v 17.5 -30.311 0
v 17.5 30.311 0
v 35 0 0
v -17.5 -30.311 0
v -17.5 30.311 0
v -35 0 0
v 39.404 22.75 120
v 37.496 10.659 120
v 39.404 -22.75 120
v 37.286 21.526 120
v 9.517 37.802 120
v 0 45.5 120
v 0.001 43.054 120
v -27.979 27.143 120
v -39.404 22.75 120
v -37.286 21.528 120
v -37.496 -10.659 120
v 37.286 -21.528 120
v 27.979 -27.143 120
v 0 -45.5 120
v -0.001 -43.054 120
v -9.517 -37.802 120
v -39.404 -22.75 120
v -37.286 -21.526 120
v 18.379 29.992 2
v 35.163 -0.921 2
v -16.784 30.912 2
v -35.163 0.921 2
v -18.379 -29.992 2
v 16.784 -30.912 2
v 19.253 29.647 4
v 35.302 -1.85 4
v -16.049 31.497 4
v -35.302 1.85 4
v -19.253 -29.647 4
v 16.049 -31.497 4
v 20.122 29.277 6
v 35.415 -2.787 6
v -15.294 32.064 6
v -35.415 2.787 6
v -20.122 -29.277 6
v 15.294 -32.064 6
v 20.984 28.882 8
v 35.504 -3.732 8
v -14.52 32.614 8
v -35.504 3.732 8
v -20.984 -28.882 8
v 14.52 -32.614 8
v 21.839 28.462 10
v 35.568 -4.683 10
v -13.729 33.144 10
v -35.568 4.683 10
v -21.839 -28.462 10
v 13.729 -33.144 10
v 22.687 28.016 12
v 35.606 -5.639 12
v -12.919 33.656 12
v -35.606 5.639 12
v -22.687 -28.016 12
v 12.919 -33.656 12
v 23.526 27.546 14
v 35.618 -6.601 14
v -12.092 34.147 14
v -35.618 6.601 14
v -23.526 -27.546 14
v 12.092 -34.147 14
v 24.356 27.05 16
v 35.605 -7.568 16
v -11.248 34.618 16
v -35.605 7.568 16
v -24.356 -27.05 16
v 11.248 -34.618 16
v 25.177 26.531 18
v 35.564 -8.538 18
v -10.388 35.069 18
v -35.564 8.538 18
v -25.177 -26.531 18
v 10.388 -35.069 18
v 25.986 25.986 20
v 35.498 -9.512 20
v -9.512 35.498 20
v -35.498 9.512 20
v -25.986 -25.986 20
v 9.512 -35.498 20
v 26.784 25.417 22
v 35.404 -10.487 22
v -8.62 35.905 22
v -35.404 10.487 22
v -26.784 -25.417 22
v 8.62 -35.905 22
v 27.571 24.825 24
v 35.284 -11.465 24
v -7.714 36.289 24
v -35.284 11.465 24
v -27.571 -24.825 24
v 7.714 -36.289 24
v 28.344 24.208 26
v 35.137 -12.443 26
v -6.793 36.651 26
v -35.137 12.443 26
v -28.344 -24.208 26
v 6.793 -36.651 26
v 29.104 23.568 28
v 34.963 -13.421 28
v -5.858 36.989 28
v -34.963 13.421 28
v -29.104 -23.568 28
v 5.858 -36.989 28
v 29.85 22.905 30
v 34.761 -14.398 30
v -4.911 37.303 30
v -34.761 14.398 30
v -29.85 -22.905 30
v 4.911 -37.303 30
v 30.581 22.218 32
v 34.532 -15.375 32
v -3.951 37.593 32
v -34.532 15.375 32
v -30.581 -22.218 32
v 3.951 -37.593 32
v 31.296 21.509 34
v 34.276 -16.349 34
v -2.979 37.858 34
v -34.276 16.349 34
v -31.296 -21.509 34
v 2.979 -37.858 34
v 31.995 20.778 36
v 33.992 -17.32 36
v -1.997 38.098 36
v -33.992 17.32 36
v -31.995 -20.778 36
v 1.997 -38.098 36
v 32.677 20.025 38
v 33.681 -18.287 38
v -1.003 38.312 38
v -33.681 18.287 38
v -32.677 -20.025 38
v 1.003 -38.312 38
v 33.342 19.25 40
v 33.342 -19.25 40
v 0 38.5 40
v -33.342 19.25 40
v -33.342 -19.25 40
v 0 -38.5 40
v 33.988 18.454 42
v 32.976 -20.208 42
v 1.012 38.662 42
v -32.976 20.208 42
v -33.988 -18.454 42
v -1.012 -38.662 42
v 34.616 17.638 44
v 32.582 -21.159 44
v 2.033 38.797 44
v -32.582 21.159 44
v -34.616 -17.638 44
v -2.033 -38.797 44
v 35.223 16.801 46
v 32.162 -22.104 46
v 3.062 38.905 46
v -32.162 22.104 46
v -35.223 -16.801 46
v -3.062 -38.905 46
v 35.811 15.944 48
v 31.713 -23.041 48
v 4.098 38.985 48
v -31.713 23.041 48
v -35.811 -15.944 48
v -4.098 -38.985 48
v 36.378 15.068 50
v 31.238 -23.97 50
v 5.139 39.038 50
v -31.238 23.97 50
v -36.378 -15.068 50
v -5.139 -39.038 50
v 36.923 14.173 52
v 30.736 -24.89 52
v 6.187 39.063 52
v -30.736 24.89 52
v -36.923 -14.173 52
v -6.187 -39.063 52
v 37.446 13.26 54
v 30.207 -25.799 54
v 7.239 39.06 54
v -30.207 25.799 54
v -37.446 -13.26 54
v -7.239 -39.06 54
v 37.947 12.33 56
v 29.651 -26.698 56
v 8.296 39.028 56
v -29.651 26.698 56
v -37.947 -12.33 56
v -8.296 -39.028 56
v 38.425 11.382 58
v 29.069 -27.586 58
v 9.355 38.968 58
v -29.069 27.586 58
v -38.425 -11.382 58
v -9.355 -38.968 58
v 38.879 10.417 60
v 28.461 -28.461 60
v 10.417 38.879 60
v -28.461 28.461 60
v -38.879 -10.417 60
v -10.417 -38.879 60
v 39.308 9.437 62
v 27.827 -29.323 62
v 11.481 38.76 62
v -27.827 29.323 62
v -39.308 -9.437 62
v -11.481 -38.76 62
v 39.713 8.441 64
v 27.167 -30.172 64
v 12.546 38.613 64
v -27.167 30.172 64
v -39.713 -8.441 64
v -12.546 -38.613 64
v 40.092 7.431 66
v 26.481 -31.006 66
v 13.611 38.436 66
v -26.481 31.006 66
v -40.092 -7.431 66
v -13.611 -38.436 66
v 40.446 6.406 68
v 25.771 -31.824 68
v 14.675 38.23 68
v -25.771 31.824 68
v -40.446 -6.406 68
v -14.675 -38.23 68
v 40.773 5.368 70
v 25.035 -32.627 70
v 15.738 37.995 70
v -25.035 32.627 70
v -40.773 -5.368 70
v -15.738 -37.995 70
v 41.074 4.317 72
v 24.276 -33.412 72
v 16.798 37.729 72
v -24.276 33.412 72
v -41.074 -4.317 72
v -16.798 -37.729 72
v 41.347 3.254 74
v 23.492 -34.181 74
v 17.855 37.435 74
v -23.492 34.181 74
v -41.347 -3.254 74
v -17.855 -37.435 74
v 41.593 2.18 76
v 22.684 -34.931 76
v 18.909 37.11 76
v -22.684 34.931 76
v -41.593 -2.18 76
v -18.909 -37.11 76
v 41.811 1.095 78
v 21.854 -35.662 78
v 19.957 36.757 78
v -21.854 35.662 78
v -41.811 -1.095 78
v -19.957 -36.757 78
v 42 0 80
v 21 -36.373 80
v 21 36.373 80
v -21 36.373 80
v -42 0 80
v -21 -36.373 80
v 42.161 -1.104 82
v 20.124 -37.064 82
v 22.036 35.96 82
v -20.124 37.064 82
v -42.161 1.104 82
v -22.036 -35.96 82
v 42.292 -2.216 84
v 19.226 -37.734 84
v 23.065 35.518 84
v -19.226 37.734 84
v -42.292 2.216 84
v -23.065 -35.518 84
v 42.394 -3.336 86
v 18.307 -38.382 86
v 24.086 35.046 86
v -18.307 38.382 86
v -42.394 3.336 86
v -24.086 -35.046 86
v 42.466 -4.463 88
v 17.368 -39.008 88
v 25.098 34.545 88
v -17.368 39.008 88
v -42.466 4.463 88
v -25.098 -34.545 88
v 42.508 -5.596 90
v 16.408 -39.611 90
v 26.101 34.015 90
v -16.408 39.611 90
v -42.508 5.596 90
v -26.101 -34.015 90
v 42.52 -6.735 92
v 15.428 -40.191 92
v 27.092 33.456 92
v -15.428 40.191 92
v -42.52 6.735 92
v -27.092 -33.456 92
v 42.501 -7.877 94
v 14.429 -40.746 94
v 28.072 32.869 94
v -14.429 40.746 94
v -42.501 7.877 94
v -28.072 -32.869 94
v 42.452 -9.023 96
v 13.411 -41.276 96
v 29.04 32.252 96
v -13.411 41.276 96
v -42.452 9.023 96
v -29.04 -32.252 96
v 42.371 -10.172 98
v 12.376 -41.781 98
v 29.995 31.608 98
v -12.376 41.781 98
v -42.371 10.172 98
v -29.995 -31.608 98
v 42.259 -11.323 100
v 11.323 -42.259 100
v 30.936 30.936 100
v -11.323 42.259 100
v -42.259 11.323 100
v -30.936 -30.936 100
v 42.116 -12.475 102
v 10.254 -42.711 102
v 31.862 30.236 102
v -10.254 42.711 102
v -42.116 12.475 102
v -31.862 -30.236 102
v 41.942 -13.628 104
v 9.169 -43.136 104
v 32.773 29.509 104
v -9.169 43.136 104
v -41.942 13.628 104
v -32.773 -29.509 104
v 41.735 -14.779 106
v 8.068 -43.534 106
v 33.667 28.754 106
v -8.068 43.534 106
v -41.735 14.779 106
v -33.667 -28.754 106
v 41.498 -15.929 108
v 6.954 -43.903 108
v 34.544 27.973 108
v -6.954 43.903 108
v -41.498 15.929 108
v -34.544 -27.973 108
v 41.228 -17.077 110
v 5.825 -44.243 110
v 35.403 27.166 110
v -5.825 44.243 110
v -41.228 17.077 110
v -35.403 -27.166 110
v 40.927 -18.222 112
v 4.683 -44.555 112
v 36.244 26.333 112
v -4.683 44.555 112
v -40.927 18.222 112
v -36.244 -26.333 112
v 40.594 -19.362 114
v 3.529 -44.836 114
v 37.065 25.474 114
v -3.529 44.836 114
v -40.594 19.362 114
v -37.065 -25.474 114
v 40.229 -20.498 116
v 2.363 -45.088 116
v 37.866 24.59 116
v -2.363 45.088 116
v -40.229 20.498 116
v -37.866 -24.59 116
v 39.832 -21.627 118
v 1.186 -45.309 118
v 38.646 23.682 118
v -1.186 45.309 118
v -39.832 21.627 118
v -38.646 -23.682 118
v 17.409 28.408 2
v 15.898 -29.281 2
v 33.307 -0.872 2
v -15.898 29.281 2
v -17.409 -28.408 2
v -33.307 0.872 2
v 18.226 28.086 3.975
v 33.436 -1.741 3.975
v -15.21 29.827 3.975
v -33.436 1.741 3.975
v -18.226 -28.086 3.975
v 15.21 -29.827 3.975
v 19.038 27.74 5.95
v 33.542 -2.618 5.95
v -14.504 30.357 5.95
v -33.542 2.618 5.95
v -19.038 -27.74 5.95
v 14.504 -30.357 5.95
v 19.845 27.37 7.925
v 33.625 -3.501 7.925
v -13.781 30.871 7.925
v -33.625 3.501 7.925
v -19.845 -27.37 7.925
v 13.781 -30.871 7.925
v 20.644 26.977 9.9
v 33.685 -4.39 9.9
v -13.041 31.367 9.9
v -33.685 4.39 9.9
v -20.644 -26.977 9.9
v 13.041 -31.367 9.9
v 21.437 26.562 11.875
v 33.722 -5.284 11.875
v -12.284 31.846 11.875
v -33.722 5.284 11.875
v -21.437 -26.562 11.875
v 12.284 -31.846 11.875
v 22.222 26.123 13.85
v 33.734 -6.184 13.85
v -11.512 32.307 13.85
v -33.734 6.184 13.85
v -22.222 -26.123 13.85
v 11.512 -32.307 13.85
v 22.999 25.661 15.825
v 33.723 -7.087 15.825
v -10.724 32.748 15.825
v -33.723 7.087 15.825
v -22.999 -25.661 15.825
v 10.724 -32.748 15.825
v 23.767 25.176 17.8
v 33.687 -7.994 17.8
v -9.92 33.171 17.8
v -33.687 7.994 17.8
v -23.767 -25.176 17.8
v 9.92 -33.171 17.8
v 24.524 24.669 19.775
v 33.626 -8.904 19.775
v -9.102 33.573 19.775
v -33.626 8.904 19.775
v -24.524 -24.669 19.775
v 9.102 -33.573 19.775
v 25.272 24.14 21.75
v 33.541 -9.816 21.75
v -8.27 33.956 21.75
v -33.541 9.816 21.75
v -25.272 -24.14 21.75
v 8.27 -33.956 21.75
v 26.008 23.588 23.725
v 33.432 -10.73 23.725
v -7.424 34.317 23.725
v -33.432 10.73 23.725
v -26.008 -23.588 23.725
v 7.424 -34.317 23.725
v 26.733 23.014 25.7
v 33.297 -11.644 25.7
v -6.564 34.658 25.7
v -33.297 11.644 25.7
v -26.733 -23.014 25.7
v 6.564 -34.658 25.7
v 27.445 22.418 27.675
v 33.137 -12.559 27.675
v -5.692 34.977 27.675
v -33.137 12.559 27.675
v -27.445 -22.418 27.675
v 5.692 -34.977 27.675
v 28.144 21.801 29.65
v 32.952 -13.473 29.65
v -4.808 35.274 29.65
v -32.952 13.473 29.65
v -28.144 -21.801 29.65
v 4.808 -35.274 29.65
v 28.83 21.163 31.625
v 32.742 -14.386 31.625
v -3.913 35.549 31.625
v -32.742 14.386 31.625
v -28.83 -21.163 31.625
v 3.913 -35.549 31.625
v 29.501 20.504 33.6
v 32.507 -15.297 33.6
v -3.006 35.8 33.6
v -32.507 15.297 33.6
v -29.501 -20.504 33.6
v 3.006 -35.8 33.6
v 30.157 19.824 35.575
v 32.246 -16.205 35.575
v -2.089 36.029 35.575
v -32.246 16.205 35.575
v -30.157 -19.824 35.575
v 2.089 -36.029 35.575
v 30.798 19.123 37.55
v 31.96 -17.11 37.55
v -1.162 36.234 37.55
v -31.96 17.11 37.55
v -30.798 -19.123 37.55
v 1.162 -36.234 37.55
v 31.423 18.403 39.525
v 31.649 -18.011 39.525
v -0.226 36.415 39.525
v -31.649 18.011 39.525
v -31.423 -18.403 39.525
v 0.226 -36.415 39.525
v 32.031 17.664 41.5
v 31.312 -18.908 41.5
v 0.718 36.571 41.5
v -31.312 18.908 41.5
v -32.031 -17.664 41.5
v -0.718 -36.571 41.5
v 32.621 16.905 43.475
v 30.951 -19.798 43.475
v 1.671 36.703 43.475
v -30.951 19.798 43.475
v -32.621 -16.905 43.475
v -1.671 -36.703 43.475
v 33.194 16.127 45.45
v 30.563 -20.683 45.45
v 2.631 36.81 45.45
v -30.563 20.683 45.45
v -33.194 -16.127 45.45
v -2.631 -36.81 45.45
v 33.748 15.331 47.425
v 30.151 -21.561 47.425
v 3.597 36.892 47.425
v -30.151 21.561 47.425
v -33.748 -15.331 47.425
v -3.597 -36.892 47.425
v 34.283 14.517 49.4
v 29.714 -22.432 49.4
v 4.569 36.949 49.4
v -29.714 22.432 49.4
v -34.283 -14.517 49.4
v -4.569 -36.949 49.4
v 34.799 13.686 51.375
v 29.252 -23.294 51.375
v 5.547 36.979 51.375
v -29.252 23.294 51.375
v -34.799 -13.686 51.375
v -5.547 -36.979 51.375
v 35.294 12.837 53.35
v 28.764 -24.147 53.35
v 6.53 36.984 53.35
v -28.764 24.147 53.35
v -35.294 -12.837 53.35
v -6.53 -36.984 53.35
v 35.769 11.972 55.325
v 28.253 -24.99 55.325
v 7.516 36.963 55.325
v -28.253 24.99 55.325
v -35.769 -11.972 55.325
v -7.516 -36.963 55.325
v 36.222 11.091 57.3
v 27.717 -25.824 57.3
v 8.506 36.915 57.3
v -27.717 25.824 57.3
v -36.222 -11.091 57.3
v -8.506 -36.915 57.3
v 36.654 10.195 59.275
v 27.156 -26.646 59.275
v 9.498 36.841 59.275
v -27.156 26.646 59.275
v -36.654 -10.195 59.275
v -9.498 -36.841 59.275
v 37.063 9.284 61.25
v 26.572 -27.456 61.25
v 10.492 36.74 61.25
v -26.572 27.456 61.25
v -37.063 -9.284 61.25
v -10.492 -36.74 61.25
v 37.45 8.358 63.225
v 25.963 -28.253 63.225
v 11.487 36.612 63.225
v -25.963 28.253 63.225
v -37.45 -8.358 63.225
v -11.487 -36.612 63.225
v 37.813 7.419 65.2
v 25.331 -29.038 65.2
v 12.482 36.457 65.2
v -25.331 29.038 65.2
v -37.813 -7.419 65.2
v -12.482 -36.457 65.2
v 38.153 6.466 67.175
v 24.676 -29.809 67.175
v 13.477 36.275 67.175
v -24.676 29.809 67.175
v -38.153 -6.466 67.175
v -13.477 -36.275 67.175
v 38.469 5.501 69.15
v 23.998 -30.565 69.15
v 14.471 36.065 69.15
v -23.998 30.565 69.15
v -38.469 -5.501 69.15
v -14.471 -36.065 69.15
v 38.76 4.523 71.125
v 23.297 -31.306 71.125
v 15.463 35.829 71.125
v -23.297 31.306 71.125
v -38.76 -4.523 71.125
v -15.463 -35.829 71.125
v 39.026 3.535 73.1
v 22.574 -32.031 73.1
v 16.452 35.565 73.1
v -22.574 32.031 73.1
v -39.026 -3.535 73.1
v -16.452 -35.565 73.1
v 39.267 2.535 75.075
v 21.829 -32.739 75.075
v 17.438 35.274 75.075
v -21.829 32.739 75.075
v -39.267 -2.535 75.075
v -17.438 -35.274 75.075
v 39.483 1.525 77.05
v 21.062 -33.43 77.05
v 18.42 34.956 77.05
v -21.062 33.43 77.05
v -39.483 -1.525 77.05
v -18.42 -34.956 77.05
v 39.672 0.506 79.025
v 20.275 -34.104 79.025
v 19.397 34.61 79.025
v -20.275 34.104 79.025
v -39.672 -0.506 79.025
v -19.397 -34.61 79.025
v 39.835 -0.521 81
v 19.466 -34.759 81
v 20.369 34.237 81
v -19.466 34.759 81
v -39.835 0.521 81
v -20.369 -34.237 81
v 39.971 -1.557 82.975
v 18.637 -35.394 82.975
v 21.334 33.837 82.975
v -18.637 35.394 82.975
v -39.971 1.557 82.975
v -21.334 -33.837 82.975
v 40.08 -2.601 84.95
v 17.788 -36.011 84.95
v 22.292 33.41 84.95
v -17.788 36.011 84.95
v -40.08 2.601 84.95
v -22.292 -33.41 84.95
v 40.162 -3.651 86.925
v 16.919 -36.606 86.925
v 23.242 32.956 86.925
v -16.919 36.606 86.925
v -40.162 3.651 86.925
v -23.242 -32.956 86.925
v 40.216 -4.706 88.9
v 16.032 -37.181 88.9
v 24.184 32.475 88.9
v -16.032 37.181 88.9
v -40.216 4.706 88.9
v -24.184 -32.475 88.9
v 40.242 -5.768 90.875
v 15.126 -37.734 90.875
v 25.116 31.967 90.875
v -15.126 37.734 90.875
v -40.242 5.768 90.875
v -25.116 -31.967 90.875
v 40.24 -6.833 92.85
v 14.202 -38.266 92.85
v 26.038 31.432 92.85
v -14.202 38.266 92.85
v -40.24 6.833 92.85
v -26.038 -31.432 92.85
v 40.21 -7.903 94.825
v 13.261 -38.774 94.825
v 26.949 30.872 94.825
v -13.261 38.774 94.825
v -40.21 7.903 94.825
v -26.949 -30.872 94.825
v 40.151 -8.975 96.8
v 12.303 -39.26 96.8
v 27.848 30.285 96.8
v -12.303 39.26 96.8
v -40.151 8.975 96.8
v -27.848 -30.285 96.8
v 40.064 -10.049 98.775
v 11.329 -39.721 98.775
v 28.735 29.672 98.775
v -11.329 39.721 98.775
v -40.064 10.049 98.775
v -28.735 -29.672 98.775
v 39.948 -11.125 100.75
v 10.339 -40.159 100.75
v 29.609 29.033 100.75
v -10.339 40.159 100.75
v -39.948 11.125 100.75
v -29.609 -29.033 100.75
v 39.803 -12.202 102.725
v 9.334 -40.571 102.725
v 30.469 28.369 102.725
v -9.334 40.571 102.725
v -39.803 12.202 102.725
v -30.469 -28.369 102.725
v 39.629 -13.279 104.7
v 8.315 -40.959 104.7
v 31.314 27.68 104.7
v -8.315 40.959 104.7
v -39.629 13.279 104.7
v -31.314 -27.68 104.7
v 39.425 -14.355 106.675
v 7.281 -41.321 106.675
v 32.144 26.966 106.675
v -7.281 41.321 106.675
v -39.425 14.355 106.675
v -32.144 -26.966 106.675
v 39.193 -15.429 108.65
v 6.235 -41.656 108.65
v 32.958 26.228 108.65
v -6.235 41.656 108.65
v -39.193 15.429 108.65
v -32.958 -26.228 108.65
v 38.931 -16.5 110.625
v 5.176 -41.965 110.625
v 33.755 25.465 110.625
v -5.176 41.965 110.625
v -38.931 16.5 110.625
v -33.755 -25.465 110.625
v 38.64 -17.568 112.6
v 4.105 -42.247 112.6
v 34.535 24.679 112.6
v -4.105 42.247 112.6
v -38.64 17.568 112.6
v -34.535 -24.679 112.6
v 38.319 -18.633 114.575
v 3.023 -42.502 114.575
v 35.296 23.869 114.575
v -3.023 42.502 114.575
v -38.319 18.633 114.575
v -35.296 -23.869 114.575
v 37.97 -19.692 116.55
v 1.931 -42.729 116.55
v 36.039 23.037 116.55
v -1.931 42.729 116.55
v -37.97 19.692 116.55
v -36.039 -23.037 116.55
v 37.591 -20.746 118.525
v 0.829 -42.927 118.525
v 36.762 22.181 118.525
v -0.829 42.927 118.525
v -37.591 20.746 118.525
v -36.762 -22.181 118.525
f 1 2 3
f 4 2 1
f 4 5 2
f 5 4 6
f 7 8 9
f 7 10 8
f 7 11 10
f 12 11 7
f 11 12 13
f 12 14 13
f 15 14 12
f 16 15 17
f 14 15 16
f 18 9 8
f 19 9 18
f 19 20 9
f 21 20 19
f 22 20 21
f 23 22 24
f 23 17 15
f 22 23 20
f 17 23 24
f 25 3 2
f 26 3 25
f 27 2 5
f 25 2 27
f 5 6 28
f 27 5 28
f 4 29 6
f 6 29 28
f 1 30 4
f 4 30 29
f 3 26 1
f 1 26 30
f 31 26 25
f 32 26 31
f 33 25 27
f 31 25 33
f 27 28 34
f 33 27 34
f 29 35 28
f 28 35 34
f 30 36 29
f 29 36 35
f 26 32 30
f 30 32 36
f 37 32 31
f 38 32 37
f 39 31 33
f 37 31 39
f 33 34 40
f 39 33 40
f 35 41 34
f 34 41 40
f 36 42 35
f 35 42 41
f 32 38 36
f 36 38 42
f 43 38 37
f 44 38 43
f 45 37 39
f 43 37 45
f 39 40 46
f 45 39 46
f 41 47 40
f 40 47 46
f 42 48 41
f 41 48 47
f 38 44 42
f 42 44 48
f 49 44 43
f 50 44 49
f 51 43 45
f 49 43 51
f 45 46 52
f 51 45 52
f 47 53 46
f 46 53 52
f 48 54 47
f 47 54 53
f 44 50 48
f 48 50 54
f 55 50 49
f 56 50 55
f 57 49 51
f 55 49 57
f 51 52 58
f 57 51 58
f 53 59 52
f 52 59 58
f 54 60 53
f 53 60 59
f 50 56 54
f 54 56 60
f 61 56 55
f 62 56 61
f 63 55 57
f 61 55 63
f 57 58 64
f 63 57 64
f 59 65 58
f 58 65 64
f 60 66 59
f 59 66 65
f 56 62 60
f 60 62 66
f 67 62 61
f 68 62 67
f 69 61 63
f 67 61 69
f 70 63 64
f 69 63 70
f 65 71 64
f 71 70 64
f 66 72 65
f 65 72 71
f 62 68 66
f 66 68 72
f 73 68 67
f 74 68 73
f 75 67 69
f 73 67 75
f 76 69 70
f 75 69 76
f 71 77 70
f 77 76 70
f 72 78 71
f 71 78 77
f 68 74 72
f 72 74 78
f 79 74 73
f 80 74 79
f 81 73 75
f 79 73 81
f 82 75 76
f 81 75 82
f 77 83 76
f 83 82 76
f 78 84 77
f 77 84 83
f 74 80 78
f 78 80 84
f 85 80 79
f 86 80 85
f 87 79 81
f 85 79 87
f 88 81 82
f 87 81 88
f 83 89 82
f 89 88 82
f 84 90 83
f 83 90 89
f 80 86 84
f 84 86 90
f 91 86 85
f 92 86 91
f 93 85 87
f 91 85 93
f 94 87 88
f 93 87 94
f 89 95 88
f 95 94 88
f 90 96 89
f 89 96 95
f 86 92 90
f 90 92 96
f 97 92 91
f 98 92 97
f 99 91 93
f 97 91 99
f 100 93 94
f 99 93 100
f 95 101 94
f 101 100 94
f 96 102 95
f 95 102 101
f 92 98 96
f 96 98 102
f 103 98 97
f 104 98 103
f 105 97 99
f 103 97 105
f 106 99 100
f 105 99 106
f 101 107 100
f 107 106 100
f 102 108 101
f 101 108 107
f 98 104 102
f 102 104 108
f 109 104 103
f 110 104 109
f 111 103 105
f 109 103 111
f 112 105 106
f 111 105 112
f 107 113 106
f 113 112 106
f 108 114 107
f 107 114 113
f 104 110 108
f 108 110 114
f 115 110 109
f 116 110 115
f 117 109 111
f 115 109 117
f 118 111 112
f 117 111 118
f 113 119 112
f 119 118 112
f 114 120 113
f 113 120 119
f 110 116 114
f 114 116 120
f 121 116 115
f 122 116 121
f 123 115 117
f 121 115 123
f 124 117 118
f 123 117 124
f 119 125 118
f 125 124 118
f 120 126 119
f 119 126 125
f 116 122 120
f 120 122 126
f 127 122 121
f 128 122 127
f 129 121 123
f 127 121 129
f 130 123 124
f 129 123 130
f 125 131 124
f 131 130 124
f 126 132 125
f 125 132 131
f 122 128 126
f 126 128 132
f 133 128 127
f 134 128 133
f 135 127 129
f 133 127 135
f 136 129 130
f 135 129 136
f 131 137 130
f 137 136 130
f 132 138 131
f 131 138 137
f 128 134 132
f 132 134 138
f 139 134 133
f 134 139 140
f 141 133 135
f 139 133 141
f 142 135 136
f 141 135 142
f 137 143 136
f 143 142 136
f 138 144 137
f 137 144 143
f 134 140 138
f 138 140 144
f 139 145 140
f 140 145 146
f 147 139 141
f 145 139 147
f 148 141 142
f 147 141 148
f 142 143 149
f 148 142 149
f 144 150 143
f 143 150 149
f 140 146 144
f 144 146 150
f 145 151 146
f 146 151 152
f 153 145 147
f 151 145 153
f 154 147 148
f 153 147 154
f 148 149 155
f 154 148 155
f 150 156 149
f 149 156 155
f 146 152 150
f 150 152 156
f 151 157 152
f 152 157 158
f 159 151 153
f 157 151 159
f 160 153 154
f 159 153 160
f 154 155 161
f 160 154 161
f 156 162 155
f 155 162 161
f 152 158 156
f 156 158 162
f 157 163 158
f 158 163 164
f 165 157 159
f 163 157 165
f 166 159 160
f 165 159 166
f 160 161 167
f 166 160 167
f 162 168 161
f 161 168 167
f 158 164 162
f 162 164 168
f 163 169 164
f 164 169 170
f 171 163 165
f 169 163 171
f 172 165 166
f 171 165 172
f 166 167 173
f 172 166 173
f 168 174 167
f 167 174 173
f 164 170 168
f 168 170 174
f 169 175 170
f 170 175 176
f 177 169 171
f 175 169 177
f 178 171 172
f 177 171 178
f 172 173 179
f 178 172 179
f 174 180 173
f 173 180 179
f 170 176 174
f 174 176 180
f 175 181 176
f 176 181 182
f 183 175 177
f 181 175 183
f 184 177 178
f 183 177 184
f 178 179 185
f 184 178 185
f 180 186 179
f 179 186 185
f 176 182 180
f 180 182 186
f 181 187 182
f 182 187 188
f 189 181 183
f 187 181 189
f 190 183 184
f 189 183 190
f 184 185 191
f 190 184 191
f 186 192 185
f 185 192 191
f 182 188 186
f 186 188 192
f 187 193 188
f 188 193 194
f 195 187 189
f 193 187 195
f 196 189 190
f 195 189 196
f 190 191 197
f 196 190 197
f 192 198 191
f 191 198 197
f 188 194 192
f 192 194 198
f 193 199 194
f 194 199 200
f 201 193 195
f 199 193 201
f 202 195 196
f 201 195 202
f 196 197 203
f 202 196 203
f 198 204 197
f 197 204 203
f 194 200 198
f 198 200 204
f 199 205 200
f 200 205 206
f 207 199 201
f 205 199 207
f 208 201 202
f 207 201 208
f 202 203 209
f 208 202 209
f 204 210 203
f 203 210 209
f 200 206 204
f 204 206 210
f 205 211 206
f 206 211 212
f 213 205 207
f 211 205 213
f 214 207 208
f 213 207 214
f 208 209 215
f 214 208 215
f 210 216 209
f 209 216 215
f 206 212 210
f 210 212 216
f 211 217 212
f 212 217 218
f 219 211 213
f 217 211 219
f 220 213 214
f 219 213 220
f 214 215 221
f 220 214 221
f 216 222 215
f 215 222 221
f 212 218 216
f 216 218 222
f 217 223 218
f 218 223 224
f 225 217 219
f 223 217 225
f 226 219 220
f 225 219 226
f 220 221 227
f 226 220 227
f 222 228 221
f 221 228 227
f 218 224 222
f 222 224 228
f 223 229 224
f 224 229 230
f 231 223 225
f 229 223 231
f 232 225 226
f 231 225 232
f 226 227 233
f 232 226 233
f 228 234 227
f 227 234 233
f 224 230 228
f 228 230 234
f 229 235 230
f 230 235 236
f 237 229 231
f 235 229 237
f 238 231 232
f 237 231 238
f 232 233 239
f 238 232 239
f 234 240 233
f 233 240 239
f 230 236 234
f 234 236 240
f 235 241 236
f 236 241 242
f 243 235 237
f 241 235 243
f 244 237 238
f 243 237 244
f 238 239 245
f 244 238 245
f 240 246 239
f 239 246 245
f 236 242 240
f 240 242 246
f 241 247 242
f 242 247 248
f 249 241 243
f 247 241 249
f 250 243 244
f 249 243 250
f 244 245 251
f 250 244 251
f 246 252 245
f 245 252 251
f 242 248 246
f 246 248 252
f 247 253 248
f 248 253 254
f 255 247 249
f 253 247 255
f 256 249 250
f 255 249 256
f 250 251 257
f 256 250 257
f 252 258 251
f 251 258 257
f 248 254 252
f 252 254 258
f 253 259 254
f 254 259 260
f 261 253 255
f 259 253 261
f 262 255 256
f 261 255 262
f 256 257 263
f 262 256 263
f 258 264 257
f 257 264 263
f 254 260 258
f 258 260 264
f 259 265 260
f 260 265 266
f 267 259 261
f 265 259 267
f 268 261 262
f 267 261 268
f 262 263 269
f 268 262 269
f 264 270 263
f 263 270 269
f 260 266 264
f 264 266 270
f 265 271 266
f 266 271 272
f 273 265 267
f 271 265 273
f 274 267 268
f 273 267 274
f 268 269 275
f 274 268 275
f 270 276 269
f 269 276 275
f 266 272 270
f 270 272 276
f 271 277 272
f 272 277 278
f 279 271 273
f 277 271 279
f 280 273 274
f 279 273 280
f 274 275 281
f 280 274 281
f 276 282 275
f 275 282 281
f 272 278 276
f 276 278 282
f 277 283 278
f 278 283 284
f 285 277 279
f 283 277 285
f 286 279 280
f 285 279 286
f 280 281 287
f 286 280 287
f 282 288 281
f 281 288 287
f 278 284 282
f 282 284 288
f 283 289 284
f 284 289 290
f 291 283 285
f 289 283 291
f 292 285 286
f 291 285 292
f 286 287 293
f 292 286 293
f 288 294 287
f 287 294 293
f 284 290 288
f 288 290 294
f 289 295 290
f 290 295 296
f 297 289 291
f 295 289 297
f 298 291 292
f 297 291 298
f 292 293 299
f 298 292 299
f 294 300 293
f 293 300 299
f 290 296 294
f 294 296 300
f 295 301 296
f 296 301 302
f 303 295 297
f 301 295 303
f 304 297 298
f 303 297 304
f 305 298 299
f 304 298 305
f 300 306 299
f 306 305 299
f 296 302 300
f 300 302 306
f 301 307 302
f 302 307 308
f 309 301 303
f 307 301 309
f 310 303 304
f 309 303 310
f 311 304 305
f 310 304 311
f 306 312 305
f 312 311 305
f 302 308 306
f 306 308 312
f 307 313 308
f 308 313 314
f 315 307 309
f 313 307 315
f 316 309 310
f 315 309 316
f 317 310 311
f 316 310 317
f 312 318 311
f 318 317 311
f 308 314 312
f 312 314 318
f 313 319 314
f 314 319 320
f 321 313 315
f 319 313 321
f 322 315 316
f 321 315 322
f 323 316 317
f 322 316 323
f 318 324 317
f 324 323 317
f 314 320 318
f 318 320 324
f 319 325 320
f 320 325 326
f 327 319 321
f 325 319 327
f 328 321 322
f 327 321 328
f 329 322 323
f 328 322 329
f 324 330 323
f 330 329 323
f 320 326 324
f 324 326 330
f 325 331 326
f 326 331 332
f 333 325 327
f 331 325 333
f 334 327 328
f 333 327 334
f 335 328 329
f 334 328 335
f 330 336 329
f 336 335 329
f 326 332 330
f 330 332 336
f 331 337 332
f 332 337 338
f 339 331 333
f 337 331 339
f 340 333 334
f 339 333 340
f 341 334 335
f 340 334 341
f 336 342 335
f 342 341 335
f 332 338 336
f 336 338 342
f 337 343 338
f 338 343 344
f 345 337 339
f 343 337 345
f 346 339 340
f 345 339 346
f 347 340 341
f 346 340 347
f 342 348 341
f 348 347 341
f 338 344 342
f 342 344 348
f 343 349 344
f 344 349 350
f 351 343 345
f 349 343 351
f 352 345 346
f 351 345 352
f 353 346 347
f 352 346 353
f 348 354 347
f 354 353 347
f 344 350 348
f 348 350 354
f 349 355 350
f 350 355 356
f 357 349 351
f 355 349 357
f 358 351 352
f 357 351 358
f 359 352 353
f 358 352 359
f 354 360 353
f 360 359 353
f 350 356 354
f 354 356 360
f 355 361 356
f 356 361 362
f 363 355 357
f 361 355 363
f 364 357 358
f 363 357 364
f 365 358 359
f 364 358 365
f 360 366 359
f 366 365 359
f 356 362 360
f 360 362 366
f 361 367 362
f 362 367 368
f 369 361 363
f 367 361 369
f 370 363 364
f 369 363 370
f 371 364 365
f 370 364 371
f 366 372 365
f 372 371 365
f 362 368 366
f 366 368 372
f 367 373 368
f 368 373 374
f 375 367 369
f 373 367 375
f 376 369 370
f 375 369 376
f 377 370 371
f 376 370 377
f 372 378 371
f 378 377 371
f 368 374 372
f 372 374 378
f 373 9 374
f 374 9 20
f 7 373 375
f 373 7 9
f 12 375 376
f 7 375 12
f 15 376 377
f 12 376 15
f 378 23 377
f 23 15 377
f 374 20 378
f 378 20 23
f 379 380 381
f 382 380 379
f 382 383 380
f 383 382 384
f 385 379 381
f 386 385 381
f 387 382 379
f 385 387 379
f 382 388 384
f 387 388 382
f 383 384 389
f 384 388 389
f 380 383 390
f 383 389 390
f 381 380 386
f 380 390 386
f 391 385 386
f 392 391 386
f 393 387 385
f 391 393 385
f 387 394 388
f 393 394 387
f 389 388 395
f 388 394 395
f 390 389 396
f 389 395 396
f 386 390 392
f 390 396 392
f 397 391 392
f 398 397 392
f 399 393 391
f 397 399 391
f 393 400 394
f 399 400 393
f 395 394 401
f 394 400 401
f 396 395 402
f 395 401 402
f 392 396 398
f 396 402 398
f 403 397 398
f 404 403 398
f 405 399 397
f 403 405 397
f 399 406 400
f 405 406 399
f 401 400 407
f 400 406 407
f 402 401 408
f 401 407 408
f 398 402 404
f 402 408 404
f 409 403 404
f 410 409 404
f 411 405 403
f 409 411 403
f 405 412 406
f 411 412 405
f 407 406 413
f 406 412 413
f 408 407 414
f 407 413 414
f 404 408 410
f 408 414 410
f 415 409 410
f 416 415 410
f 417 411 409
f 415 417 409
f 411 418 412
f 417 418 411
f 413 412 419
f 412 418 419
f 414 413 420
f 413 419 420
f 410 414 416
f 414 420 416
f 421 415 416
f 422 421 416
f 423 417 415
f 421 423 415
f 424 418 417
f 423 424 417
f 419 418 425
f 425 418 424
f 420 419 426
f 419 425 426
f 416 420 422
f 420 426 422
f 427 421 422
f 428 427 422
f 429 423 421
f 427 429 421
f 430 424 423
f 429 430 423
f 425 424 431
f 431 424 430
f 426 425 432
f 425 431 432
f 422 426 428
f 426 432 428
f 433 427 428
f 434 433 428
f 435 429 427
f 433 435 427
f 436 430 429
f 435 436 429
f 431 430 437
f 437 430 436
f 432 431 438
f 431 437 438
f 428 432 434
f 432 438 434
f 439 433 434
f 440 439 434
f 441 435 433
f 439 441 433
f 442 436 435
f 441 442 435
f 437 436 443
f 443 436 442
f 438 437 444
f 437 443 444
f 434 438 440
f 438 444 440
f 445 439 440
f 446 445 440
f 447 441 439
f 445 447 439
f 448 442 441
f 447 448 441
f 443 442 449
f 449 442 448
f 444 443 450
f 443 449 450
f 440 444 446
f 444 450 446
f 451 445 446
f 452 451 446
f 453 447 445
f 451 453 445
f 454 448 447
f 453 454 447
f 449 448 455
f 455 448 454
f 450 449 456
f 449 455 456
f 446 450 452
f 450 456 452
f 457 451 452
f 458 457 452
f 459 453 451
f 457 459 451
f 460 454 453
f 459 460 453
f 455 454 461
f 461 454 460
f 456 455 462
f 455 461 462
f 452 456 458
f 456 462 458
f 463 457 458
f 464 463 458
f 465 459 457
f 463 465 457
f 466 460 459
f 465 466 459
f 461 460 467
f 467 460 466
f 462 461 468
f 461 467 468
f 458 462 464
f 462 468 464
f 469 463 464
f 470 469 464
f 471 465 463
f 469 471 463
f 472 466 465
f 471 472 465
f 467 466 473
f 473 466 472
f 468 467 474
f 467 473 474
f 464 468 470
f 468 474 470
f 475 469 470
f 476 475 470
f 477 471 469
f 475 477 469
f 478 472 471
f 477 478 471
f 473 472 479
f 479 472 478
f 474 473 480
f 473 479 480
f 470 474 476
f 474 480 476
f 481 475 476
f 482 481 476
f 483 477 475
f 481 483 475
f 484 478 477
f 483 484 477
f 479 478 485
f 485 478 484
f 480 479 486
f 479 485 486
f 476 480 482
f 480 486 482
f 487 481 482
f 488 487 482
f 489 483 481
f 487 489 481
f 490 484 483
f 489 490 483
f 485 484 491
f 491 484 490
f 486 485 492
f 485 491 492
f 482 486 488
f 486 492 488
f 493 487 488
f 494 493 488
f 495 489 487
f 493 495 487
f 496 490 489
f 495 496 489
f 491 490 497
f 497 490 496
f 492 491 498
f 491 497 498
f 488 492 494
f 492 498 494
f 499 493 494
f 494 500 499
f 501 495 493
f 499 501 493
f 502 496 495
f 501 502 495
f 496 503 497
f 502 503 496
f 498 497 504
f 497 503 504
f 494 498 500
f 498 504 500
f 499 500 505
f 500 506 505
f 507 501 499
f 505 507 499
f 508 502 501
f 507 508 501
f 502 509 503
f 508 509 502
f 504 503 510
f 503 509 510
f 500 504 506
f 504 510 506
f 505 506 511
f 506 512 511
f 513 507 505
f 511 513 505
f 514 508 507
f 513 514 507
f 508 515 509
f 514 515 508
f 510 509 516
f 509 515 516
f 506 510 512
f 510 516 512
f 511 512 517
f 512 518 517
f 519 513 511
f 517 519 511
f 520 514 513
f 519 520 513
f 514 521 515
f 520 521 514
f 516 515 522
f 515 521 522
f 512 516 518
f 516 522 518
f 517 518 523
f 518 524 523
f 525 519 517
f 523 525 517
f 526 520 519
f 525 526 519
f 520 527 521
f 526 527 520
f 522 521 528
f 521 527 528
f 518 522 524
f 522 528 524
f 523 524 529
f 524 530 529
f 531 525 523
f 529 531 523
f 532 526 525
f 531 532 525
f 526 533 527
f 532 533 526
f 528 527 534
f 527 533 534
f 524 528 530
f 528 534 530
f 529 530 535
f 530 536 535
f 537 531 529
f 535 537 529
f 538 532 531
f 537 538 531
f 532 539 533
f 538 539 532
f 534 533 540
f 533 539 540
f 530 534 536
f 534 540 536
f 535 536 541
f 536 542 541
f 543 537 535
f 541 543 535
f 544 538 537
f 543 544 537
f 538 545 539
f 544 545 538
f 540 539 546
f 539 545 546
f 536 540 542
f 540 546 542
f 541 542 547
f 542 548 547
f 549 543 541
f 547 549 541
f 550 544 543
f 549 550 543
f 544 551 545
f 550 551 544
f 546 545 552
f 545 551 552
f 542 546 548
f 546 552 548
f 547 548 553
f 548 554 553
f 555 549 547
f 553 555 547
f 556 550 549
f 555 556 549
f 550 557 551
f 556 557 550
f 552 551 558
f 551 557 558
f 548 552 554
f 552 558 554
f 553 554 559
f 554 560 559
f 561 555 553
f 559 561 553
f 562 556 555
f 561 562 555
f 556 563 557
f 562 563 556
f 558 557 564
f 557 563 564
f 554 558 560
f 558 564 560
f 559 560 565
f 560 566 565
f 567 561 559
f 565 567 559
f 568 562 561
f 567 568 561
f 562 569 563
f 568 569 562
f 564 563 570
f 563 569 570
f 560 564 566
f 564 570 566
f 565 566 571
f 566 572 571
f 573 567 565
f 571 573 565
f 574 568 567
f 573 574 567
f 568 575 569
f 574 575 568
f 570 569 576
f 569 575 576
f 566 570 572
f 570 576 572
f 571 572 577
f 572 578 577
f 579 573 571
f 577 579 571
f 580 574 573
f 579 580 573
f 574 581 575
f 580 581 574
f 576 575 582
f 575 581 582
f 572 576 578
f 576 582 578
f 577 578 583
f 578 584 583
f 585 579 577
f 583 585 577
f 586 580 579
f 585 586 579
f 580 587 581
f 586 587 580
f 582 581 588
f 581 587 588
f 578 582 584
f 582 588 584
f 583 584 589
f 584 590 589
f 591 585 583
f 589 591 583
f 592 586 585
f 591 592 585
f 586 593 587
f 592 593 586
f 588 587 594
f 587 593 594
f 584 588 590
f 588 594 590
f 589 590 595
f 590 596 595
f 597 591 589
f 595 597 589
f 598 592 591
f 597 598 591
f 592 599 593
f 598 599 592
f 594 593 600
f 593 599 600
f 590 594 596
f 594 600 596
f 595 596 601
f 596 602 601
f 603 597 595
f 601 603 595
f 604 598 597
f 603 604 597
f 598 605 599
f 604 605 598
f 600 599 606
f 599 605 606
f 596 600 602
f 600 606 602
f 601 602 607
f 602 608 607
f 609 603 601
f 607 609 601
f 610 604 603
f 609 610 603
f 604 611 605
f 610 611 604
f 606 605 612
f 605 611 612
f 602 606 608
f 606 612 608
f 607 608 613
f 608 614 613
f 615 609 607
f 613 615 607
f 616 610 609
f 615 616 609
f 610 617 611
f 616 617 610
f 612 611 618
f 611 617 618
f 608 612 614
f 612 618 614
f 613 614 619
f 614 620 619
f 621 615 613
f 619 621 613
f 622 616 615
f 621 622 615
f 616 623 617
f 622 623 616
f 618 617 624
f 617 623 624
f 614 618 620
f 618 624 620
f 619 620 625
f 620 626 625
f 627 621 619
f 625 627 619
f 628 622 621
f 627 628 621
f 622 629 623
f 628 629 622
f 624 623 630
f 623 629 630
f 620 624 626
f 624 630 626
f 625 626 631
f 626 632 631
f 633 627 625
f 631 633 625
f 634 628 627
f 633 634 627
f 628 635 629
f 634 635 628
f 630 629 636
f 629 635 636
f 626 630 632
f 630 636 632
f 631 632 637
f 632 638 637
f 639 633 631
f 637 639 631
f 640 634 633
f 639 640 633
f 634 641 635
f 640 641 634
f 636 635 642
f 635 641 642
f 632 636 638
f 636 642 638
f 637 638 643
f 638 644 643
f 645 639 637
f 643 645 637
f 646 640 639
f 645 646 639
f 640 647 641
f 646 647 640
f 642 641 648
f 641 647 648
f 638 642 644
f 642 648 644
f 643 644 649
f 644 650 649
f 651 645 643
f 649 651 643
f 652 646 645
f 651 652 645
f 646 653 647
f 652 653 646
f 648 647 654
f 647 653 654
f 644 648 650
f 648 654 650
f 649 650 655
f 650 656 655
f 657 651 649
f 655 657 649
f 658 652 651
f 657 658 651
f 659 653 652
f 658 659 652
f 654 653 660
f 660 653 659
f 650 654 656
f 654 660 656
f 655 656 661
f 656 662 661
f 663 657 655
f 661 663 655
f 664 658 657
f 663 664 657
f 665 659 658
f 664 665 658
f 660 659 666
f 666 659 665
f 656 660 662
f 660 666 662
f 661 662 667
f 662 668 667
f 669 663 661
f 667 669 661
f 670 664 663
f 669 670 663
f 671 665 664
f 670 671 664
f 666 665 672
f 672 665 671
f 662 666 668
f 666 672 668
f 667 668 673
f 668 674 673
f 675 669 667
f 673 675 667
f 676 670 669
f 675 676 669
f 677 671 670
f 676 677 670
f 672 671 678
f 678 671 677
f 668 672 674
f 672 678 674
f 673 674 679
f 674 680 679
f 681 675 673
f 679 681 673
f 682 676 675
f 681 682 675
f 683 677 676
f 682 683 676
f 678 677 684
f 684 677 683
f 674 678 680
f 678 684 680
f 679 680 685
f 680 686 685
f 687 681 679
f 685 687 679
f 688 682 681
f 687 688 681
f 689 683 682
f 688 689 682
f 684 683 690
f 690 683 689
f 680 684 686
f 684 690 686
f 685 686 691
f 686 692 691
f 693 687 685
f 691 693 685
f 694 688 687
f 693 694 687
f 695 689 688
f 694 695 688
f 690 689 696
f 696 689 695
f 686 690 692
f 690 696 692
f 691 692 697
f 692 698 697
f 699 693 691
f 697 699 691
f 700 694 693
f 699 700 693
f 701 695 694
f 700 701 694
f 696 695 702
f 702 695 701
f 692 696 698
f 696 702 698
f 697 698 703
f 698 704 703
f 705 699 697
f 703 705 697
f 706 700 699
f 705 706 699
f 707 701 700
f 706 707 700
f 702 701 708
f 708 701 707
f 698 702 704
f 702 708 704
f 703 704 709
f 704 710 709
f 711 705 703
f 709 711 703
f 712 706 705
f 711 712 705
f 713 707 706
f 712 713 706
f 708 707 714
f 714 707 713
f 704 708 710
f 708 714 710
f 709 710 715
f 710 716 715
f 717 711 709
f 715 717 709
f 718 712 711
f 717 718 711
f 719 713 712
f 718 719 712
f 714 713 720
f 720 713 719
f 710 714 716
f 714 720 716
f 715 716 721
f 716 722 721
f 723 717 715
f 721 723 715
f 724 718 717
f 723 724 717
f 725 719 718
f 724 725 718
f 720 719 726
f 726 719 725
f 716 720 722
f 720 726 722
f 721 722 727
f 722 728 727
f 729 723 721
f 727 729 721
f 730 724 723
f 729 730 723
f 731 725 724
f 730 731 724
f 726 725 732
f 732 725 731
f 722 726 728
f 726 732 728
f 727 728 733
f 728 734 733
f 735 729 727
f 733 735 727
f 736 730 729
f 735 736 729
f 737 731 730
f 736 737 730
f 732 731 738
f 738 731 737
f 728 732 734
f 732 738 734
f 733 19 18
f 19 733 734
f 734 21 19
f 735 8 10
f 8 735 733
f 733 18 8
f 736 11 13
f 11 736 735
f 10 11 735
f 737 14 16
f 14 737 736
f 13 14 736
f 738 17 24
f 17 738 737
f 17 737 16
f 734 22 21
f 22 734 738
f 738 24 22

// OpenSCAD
// ARTIFEX template: twisted polygon vase
diameter = 70;
height = 120;
sides = 6;
twist = 90;
top_scale = 1.3;
wall = 1.6;
floor_t = 2;

s0 = 1 + (top_scale - 1) * floor_t / height;

difference() {
    linear_extrude(height, twist = twist, scale = top_scale, slices = 60)
        circle(d = diameter, $fn = sides);
    translate([0, 0, floor_t]) rotate([0, 0, -twist * floor_t / height])
        linear_extrude(height - floor_t + 0.5, twist = twist * (height - floor_t + 0.5) / height,
                       scale = top_scale / s0, slices = 60)
            scale(s0) offset(r = -wall) circle(d = diameter, $fn = sides);
}
